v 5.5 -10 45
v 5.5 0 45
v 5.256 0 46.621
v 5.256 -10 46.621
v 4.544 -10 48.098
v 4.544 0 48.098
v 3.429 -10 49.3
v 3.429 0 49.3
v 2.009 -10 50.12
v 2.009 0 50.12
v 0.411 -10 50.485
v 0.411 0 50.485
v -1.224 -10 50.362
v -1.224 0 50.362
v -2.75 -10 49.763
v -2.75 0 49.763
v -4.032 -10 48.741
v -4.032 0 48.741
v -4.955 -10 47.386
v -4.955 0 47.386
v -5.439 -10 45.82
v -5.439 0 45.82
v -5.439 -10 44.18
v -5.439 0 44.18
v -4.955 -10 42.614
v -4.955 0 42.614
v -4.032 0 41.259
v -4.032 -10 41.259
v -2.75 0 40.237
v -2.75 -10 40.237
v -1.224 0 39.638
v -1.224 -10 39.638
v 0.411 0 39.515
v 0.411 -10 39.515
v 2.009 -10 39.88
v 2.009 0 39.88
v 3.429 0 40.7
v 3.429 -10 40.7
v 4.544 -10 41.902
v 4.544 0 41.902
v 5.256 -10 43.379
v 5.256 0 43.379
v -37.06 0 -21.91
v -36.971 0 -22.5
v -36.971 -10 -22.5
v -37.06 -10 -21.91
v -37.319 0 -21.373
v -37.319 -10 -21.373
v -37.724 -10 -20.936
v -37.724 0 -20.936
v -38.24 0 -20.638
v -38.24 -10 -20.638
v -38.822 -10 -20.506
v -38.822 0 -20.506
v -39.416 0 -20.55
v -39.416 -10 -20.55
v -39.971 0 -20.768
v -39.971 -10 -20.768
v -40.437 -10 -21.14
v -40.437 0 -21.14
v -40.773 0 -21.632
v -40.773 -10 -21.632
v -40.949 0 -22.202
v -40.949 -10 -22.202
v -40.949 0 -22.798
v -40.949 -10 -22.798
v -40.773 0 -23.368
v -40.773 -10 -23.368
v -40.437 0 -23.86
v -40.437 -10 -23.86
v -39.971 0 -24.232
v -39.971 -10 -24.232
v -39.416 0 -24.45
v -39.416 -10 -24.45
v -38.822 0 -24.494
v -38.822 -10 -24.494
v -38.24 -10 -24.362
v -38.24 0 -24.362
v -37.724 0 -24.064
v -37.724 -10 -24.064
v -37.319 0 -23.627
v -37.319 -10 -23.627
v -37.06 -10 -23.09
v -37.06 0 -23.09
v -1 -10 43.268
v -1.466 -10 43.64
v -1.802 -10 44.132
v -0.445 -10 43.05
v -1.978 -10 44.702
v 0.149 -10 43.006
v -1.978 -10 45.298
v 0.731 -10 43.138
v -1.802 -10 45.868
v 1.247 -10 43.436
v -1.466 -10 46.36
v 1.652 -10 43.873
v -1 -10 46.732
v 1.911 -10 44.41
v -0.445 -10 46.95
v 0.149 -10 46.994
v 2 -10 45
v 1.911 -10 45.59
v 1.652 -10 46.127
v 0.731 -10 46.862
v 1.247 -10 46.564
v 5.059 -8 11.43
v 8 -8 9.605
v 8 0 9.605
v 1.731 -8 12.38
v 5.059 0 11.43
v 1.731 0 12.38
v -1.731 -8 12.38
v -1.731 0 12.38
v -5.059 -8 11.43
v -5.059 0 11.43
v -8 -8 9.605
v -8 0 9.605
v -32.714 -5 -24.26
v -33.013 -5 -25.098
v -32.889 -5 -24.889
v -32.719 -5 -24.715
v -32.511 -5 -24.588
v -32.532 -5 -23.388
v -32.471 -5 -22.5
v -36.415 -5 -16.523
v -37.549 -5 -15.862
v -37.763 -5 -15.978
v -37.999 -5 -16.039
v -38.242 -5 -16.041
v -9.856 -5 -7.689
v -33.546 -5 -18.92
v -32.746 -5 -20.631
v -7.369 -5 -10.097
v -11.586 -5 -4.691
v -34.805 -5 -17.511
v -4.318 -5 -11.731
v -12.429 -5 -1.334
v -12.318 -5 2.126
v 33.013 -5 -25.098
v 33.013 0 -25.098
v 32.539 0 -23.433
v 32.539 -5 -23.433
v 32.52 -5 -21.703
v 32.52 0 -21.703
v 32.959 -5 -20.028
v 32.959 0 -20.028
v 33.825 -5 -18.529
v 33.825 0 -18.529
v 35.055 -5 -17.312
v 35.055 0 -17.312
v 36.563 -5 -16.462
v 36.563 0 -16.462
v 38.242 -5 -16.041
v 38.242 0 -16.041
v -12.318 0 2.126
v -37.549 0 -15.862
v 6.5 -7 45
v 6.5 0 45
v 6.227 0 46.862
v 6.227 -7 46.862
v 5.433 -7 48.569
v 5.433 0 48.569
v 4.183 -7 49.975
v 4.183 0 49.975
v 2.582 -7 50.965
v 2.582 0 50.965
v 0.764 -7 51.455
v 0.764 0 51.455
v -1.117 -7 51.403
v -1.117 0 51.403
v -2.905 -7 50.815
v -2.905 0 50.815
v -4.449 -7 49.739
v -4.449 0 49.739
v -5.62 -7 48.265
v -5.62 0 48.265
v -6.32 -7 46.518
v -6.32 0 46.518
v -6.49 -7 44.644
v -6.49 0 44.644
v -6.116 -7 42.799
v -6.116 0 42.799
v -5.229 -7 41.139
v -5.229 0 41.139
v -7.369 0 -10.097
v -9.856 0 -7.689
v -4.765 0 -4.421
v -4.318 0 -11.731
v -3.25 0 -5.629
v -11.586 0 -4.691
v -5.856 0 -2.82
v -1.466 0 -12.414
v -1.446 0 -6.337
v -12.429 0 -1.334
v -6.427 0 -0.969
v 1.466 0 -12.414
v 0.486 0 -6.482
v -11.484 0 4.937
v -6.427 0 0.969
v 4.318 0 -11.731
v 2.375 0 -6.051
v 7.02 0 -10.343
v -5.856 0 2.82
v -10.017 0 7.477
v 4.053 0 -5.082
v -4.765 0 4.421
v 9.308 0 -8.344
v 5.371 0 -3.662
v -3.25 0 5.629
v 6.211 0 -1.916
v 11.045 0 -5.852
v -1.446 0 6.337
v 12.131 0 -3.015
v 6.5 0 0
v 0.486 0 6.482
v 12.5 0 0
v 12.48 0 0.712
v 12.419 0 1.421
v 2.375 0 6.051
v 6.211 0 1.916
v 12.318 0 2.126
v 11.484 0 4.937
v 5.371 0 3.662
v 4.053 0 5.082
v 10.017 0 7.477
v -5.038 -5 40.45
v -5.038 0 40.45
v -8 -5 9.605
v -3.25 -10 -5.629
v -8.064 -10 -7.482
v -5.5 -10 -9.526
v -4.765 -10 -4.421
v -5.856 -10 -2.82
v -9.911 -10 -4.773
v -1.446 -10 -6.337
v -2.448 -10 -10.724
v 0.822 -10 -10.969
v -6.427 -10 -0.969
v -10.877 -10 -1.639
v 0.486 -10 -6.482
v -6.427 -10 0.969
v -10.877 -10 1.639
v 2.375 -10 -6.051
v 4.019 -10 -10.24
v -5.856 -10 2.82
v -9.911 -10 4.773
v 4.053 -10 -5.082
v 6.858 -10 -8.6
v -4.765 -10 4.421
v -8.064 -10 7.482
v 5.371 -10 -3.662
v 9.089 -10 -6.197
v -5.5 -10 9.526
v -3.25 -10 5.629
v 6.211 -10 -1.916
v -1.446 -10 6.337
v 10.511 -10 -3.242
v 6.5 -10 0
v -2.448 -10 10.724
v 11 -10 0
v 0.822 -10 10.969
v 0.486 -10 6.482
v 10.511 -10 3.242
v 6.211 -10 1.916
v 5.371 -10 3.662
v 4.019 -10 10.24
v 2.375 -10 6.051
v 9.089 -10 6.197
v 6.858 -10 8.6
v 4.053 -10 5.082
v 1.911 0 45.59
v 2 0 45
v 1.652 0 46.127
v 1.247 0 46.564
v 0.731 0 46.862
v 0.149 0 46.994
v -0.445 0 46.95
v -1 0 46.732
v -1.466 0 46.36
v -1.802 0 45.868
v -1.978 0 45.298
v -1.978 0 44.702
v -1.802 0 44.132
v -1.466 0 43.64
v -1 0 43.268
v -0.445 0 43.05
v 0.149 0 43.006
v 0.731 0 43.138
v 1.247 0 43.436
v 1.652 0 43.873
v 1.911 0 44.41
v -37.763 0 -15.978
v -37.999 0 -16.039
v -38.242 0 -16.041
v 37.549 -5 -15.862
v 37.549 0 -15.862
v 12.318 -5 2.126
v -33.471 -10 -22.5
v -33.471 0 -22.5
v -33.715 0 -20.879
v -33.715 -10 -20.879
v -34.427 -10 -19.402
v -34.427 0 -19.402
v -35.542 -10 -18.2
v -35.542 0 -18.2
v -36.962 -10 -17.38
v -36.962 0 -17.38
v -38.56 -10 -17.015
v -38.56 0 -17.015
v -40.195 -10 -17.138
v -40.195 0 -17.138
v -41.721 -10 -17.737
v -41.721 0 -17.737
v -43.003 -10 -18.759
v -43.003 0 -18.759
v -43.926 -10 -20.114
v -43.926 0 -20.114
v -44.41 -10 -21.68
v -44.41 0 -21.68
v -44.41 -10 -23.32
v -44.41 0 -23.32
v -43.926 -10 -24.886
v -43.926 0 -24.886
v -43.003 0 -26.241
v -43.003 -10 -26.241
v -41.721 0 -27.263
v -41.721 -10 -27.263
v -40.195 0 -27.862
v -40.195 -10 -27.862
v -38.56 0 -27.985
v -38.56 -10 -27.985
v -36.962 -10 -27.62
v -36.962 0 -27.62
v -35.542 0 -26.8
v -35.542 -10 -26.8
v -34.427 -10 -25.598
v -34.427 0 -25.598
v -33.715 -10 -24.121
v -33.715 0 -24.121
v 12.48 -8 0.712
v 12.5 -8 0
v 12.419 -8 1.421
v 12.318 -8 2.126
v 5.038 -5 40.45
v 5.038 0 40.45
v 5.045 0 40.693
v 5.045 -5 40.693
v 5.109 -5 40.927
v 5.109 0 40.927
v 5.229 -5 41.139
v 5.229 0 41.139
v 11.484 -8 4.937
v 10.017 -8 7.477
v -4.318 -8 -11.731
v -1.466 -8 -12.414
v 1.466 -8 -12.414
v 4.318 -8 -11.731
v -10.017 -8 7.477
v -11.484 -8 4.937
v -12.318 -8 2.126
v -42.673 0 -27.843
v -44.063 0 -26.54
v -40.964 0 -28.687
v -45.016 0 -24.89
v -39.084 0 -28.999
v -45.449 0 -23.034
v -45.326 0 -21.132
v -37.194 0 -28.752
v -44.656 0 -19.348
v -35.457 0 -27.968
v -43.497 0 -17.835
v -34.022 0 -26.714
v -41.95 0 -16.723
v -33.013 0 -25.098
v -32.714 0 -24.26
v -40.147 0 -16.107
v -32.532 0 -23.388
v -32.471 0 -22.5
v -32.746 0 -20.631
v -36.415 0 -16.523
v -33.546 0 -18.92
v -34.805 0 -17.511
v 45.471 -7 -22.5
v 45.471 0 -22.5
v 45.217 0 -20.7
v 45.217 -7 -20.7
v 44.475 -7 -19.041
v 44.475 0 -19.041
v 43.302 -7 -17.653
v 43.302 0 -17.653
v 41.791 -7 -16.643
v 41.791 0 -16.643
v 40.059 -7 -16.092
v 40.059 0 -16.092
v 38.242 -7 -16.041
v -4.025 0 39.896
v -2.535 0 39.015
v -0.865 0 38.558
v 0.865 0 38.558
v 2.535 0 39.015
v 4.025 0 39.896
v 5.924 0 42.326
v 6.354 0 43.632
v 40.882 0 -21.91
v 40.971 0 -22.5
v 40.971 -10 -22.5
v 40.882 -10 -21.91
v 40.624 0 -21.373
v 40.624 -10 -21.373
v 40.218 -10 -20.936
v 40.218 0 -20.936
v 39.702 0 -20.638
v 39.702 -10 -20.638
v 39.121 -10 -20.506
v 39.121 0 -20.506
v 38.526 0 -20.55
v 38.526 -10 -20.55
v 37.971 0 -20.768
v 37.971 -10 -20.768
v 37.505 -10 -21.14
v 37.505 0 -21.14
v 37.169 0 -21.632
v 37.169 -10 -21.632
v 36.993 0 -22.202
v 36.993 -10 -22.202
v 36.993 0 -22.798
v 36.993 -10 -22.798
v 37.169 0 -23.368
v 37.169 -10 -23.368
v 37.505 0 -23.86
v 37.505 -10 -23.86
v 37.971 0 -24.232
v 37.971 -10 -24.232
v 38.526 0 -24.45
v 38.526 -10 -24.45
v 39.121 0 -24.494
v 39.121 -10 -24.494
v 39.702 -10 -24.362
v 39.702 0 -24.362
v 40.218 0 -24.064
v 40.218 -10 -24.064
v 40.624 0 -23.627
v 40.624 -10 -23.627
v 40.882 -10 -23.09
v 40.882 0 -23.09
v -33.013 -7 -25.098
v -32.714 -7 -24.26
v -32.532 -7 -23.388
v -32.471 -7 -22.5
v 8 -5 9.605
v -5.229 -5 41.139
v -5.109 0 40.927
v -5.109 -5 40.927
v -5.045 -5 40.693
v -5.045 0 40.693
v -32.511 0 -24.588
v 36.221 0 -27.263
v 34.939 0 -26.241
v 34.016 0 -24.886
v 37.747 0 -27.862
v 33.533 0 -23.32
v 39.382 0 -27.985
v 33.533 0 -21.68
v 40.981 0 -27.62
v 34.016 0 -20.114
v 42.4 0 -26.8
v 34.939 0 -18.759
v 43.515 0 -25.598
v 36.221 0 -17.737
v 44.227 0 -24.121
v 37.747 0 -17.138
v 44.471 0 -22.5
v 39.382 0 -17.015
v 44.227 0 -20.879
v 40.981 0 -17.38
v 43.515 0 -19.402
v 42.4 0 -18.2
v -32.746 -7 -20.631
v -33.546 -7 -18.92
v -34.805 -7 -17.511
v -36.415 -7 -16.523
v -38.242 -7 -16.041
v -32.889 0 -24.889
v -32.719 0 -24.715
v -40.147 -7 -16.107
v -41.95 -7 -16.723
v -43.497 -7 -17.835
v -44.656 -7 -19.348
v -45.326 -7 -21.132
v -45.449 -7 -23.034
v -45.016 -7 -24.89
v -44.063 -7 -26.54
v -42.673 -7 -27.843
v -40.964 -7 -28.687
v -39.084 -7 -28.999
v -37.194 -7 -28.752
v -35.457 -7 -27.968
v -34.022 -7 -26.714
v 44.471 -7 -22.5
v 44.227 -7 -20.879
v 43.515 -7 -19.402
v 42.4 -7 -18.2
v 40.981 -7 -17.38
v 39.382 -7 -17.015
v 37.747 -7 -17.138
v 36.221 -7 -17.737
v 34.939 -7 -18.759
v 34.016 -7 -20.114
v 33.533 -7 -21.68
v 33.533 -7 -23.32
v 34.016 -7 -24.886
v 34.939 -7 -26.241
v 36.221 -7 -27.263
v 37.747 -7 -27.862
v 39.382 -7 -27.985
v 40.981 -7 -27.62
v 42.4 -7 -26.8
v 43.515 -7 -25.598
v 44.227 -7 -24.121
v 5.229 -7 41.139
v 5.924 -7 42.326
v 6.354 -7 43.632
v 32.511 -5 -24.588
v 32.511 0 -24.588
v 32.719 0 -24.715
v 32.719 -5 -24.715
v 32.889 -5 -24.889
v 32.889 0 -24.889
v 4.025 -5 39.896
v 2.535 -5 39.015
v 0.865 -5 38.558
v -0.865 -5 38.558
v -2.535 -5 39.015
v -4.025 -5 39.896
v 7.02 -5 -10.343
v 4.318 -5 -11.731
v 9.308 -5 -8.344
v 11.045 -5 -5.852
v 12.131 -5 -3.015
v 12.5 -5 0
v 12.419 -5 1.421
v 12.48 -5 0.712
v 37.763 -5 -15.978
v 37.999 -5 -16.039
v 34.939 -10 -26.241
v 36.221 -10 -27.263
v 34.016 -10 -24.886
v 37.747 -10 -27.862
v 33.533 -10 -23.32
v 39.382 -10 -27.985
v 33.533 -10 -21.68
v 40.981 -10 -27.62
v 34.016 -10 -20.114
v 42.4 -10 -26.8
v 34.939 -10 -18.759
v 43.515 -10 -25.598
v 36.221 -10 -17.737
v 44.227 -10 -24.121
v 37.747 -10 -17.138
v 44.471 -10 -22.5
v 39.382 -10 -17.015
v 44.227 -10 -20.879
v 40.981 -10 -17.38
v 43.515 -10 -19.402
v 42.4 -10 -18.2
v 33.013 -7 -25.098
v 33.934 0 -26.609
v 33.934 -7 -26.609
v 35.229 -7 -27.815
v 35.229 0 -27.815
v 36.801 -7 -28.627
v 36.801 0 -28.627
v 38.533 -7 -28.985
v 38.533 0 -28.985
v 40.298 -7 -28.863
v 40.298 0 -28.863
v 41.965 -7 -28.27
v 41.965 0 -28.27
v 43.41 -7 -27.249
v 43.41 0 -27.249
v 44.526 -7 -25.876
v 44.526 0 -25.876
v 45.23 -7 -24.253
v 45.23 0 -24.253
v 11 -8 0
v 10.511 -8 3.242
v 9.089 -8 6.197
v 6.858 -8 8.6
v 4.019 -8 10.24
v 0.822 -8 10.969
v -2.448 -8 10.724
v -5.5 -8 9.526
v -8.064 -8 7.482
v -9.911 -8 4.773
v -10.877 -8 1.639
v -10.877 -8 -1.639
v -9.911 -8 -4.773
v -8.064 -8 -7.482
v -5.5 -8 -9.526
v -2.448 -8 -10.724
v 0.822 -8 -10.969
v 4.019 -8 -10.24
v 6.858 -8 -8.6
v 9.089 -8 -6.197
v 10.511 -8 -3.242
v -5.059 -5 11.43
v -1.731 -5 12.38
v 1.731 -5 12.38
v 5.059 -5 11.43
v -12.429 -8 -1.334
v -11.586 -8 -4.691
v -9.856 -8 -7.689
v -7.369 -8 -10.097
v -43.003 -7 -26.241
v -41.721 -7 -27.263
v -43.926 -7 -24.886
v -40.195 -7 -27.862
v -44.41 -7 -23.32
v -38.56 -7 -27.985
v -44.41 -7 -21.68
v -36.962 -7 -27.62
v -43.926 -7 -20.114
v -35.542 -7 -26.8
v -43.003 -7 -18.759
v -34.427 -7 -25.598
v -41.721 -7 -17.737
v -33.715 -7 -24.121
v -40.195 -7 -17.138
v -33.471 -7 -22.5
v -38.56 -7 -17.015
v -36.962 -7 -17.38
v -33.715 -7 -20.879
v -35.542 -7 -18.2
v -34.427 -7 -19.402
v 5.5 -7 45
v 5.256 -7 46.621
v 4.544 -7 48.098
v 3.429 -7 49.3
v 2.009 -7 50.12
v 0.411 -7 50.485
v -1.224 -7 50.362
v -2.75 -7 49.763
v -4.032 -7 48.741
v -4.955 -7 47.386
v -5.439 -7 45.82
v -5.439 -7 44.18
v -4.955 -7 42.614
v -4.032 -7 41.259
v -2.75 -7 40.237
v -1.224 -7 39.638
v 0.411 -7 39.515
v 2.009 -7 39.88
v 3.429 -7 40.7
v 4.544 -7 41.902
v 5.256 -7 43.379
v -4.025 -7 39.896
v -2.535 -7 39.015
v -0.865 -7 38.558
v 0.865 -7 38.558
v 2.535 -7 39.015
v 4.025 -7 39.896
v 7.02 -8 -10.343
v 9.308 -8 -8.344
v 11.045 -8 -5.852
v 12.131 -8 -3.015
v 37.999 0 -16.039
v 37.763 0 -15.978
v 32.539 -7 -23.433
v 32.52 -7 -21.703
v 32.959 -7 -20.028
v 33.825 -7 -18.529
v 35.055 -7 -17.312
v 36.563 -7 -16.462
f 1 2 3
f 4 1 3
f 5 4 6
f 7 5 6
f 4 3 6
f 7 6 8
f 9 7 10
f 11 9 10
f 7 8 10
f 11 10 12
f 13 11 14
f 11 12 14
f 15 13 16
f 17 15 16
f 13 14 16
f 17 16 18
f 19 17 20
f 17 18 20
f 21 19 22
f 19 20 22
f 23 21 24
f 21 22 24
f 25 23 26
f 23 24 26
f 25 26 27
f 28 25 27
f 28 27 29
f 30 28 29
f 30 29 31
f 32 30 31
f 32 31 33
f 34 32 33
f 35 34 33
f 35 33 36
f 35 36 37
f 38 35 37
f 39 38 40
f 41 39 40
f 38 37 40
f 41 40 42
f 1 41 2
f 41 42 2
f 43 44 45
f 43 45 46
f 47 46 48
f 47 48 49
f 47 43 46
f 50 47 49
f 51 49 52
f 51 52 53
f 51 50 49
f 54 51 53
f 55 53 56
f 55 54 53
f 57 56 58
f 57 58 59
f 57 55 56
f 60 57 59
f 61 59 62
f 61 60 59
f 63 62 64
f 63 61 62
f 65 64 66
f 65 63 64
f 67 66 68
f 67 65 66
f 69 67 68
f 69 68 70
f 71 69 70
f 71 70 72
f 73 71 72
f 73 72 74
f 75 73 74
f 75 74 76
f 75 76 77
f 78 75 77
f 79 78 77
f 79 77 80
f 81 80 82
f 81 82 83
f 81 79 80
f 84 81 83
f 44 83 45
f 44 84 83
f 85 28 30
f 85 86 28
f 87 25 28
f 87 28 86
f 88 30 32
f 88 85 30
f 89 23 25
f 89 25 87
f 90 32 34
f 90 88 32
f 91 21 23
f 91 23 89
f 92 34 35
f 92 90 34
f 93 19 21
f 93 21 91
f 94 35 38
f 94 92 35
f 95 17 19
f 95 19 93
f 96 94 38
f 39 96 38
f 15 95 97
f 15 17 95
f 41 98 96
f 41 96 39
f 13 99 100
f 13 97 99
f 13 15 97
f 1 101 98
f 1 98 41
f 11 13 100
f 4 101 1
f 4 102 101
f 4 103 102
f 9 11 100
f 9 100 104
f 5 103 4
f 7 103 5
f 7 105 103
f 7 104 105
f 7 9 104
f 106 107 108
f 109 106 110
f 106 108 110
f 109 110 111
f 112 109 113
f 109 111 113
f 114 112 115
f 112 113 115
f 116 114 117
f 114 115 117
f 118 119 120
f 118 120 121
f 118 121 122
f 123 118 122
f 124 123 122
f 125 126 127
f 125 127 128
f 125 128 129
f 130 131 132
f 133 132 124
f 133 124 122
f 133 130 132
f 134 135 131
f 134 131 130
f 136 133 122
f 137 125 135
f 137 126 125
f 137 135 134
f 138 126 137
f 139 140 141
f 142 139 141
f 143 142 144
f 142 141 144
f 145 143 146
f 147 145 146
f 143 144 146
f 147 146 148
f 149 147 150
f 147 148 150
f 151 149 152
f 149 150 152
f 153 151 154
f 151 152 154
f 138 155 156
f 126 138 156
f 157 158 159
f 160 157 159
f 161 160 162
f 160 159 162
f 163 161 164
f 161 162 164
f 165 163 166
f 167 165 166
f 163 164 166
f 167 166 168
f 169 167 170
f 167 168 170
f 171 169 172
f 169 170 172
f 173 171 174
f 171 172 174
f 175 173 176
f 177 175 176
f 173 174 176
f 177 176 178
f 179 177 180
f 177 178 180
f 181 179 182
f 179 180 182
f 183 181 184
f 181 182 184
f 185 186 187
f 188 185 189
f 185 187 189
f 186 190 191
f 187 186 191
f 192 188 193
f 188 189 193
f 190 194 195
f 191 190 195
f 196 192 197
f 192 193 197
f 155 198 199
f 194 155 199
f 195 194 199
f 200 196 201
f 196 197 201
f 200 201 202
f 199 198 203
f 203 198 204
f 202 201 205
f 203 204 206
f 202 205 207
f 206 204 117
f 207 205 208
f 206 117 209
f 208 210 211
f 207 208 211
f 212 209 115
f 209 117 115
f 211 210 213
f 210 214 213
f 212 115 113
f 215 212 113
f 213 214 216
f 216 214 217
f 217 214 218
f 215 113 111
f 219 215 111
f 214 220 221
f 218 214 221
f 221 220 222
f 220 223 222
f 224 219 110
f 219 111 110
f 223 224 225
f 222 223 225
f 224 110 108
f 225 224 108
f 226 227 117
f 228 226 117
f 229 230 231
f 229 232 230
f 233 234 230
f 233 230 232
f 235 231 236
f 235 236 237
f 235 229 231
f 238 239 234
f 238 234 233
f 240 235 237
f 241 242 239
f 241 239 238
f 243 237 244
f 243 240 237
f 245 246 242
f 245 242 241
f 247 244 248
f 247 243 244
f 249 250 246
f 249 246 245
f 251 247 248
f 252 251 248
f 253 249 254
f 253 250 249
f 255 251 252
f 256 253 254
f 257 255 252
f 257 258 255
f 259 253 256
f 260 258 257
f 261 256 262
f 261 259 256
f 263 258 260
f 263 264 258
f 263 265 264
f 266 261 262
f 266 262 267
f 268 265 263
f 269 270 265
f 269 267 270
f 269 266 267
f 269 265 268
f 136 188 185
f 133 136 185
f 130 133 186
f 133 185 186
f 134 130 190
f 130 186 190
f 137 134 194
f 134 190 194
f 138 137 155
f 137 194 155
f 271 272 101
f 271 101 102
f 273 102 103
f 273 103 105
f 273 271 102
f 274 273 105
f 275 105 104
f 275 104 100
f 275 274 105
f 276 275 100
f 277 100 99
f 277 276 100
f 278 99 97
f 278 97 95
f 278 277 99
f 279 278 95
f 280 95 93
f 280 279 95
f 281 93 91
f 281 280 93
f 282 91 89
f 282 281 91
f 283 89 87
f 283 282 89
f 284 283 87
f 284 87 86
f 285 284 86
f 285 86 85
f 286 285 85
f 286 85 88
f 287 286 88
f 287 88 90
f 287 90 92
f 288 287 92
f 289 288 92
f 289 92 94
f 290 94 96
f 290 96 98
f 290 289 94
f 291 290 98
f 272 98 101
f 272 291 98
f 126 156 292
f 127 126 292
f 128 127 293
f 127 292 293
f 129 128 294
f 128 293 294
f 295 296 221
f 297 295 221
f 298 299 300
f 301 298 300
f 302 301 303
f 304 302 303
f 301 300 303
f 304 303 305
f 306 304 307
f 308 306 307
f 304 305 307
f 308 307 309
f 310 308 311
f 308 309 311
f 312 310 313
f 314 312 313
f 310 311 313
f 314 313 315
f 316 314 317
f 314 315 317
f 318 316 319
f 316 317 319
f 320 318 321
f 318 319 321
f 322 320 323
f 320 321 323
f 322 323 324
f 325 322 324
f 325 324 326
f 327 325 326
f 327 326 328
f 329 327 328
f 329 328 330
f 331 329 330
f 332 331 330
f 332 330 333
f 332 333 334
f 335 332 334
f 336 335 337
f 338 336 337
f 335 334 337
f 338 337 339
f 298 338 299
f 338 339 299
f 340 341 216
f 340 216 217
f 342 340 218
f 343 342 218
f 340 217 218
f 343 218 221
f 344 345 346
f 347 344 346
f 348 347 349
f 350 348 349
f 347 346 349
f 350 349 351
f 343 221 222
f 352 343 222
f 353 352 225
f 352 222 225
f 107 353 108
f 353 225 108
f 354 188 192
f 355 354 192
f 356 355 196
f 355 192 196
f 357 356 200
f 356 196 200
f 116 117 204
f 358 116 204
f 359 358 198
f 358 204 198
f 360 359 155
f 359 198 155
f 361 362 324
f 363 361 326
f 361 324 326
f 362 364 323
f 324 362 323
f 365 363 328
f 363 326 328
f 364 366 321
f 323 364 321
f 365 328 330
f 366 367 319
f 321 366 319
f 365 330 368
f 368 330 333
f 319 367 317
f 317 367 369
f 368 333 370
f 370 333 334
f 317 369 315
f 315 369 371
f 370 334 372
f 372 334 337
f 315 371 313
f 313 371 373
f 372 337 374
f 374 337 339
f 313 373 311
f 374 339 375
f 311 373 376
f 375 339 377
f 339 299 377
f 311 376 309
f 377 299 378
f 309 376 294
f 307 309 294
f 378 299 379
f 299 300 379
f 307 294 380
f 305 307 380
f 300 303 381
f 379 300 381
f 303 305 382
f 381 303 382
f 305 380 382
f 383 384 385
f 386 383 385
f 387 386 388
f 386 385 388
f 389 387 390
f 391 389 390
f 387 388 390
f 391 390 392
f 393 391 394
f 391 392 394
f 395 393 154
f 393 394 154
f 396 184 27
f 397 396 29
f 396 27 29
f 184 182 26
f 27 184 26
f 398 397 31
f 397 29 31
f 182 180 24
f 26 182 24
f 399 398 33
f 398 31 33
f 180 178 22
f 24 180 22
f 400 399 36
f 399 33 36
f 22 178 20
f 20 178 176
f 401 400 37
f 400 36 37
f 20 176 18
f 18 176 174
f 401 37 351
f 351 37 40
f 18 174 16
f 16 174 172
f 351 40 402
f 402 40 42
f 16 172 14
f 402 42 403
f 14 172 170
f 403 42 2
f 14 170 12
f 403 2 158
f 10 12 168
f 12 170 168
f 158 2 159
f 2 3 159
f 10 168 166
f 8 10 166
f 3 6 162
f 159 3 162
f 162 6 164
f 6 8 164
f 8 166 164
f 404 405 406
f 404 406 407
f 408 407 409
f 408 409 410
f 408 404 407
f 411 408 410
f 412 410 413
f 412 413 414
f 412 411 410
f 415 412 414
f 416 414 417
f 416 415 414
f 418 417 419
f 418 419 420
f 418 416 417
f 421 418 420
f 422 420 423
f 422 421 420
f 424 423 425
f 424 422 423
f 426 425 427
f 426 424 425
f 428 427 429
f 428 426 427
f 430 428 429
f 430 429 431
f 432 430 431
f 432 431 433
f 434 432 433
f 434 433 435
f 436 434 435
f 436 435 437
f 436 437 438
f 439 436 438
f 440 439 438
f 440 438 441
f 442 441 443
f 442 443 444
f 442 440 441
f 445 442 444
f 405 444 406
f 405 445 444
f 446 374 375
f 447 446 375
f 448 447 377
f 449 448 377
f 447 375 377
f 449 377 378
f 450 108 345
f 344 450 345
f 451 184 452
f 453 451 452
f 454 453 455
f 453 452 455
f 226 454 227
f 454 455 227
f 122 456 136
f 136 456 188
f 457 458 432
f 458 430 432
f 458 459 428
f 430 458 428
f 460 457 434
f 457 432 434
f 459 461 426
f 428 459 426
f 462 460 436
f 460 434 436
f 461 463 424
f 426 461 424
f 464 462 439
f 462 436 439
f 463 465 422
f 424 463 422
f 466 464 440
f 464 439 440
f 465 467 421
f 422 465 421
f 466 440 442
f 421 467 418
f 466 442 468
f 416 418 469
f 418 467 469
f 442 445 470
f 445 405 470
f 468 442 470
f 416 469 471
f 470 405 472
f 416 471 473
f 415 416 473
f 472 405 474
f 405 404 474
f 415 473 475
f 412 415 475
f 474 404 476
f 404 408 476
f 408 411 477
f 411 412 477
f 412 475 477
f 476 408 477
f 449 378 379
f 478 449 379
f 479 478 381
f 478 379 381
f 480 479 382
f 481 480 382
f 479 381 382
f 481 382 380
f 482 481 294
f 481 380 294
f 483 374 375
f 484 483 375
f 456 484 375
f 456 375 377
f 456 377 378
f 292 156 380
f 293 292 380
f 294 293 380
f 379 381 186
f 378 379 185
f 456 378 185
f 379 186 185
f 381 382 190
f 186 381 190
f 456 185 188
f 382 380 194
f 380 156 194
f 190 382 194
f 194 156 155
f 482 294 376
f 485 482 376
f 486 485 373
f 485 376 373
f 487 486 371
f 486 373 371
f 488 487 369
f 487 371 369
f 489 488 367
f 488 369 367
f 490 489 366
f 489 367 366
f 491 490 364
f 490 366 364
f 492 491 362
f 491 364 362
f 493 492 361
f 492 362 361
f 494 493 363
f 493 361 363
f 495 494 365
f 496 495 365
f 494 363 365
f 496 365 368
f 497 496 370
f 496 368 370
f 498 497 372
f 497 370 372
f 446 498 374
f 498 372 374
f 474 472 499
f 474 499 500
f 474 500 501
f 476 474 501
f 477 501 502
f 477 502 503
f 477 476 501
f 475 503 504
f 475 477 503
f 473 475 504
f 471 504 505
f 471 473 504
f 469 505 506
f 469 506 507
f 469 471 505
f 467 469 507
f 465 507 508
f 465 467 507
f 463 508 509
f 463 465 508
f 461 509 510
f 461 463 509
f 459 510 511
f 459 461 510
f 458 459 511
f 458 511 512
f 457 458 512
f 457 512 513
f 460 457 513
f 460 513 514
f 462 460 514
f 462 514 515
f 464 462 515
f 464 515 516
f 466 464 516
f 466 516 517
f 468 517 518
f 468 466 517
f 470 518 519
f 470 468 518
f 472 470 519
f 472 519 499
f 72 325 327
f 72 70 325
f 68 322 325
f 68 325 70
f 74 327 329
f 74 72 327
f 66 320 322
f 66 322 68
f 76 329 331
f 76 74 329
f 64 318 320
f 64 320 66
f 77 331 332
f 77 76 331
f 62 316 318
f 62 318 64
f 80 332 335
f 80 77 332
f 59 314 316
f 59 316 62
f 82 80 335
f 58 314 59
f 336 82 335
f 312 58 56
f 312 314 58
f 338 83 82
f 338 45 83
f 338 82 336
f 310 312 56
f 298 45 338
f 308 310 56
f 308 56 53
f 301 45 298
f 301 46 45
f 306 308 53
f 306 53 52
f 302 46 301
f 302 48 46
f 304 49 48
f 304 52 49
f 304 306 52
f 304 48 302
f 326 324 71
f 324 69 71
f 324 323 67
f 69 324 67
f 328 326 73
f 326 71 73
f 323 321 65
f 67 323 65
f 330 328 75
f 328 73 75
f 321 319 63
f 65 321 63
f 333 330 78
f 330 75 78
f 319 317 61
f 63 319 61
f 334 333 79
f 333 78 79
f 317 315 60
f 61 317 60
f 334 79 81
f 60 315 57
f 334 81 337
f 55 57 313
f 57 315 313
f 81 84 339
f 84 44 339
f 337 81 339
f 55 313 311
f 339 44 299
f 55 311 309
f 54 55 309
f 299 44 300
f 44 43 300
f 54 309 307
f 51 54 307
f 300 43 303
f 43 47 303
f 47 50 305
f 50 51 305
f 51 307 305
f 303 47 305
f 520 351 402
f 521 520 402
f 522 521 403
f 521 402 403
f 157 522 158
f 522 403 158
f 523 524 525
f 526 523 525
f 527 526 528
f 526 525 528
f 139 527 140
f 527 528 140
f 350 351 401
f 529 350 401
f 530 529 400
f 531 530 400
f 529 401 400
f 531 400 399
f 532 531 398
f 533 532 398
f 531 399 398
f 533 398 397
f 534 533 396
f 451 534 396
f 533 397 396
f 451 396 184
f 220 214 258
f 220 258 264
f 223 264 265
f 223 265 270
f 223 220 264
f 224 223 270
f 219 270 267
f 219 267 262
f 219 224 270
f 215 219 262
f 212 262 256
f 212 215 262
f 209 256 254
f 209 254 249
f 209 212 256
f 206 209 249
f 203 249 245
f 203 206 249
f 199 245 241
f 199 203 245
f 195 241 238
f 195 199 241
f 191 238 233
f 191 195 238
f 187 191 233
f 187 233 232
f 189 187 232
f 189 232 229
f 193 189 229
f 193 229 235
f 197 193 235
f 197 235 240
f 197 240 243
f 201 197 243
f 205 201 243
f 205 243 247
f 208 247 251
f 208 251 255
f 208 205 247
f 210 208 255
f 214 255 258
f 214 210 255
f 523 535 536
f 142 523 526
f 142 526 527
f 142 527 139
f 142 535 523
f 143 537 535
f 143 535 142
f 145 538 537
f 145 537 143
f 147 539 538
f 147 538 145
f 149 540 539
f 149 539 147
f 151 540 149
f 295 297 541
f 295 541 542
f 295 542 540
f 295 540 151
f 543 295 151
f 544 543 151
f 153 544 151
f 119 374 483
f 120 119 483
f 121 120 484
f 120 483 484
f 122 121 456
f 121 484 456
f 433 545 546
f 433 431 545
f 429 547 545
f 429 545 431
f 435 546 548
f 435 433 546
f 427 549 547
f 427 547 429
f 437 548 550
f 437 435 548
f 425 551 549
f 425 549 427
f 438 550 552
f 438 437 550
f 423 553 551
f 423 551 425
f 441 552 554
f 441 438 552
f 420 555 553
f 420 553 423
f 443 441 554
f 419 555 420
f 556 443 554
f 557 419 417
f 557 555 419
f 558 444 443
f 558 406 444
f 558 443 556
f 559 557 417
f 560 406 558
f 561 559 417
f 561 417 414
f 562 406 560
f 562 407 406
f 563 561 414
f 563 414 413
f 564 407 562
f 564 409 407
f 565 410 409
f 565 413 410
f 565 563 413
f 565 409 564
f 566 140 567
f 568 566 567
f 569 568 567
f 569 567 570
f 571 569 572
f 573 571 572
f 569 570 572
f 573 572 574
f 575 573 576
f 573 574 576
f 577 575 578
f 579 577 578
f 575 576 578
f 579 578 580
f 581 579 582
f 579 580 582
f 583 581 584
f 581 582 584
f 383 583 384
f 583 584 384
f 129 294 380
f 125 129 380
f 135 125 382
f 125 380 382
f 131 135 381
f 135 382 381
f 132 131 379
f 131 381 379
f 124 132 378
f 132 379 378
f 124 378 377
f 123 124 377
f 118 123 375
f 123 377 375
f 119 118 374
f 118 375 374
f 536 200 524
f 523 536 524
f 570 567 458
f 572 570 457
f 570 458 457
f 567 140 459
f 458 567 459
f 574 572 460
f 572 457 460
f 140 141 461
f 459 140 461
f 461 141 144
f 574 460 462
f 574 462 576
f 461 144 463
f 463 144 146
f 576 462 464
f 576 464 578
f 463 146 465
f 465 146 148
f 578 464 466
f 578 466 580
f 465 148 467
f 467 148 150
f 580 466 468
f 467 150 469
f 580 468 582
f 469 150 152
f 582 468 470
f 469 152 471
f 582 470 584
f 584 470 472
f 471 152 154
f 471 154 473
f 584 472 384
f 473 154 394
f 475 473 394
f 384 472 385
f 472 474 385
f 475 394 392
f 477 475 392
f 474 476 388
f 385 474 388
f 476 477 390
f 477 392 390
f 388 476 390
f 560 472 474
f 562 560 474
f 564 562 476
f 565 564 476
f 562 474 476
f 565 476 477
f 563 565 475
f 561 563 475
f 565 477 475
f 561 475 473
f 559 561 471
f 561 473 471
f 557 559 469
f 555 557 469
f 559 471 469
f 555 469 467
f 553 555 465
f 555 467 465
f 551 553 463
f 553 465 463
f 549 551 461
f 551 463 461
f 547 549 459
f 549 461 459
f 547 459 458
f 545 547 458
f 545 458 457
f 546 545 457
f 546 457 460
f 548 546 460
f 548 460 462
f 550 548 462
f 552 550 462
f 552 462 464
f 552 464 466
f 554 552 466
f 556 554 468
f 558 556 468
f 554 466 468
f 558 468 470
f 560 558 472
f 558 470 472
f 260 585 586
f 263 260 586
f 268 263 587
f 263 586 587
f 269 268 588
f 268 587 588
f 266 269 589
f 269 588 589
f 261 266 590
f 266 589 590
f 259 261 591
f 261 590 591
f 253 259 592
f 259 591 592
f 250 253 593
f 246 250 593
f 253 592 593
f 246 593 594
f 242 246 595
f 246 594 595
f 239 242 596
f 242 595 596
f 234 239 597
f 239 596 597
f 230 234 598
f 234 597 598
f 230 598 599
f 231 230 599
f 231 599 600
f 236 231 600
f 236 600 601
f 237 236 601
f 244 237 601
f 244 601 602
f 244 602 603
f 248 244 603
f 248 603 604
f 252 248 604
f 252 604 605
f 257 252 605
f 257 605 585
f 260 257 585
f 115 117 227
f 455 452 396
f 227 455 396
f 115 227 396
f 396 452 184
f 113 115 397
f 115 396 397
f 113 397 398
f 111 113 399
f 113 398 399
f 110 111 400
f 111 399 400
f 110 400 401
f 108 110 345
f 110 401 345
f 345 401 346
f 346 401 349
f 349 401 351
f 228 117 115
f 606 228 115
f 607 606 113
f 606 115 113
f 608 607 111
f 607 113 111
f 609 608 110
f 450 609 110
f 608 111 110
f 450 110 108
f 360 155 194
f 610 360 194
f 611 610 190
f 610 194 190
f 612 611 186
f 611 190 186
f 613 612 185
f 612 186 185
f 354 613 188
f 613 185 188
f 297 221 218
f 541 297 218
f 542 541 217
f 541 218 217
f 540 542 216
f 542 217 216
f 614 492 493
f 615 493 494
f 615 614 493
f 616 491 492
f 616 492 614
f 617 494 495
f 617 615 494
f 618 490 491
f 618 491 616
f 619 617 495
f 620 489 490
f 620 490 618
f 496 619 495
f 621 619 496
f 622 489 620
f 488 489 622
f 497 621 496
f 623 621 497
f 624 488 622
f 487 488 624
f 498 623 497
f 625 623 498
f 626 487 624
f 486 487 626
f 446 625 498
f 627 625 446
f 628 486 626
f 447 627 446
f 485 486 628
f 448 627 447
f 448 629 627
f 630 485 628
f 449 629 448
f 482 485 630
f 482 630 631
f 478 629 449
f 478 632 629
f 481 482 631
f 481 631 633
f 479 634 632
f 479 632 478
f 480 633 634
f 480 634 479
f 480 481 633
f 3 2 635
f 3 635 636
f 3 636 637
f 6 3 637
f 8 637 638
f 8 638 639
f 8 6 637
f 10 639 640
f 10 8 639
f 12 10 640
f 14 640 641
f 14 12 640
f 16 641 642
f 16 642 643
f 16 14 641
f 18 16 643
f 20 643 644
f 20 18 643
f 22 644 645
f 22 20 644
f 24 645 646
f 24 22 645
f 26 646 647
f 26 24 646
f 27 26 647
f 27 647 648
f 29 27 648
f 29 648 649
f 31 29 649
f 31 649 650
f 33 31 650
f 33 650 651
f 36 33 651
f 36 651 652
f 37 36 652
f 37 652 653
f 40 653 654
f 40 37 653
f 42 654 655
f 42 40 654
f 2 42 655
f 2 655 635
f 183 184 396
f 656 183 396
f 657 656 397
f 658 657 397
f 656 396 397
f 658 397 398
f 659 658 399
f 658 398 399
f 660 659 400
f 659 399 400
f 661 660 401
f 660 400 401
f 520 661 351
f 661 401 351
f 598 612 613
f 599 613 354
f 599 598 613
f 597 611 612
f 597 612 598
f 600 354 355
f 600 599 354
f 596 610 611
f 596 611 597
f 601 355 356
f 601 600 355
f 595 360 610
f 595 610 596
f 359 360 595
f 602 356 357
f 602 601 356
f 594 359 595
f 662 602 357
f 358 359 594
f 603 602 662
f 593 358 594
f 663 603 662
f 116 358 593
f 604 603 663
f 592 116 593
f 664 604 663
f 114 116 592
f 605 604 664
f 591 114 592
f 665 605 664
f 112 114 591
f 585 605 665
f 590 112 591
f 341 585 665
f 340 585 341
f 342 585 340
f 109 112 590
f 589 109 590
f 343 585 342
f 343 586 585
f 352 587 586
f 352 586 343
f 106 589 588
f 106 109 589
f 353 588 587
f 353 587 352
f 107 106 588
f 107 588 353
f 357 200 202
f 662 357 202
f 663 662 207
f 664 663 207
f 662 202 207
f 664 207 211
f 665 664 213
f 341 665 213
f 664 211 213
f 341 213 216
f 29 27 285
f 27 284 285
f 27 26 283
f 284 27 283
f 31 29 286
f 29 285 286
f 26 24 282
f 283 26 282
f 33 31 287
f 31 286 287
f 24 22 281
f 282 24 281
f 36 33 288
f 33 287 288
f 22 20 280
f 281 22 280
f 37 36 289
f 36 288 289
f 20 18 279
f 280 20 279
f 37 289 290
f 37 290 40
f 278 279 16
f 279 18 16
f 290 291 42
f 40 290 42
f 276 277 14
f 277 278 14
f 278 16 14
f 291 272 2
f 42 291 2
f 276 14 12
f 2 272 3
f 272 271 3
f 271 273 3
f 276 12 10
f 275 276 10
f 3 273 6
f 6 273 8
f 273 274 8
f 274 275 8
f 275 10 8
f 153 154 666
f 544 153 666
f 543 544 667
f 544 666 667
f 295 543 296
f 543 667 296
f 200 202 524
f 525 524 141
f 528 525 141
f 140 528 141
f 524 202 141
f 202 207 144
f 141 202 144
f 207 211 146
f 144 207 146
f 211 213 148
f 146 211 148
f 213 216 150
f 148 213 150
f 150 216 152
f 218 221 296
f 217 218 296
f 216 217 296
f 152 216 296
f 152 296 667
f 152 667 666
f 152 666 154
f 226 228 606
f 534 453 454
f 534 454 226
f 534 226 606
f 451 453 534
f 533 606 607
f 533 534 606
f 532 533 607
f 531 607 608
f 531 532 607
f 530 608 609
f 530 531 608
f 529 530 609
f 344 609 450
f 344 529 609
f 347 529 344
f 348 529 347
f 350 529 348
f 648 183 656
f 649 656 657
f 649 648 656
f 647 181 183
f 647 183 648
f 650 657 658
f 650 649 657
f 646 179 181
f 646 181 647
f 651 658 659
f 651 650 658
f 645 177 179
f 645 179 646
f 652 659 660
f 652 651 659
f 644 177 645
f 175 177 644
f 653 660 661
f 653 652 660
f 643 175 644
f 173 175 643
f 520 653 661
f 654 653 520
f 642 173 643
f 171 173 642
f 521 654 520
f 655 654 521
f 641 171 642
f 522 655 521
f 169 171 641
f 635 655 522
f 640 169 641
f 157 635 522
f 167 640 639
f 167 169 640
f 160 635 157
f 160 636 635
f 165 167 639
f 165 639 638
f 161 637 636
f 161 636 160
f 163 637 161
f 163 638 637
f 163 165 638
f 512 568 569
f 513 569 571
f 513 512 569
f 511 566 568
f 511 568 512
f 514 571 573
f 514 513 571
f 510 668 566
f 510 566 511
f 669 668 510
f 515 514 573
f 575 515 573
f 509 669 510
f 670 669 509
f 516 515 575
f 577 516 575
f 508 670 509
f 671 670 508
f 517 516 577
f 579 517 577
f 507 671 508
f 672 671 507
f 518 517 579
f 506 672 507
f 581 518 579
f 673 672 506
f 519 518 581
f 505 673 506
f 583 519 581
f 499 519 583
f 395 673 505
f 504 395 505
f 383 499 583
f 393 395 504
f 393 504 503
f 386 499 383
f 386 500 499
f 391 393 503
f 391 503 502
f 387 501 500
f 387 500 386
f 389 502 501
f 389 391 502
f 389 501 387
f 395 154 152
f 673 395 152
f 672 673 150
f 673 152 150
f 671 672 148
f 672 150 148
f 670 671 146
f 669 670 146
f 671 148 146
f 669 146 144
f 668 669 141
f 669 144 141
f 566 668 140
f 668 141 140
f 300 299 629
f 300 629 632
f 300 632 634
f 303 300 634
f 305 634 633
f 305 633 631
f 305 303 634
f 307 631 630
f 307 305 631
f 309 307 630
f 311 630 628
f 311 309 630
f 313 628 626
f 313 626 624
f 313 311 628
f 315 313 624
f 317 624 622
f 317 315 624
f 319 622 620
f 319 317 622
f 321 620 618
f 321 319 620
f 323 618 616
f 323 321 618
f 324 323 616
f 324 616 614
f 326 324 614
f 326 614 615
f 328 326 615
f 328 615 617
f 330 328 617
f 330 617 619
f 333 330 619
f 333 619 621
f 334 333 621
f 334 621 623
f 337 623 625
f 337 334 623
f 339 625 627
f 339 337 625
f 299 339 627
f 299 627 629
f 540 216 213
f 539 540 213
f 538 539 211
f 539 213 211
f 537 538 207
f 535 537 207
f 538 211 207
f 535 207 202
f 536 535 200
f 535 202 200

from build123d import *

# Parameters (mm, degrees)
F1_DEPTH = 5
F0_R     = 11
F2_DEPTH = 8
F0_R_2   = 6.5
F3_DEPTH = 10
F0_R_3   = 5.5
F4_DEPTH = 7
F0_R_4   = 2
F5_DEPTH = 10


with BuildPart() as f1:
    # F0 (on Front) → F1 (new body)
    with BuildSketch(Plane.XZ):
        with BuildLine():
            ThreePointArc((-8, 9.604686), (0, 12.5), (8, 9.604686))
            Line((8, 9.604686), (5.038139, 40.449513))
            ThreePointArc((5.038139, 40.449513), (5.069826, 40.811961), (5.229085, 41.139085))
            ThreePointArc((5.229085, 41.139085), (0, 38.5), (-5.229085, 41.139085))
            ThreePointArc((-5.229085, 41.139085), (-5.069826, 40.811961), (-5.038139, 40.449513))
            Line((-5.038139, 40.449513), (-8, 9.604686))
        make_face()
        with BuildLine():
            ThreePointArc((12.317902, 2.12586), (12.454392, 1.066822), (12.5, 0))
            ThreePointArc((12.5, 0), (10.252409, -7.151092), (4.317902, -11.730546))
            Line((4.317902, -11.730546), (32.511236, -24.587912))
            ThreePointArc((32.511236, -24.587912), (32.809283, -24.796579), (33.01295, -25.098063))
            ThreePointArc((33.01295, -25.098063), (33.341978, -19.25), (38.242035, -16.041022))
            ThreePointArc((38.242035, -16.041022), (37.879108, -16.015383), (37.549375, -15.8616))
            Line((37.549375, -15.8616), (12.317902, 2.12586))
        make_face()
        with BuildLine():
            Line((-32.511236, -24.587912), (-4.317902, -11.730546))
            ThreePointArc((-4.317902, -11.730546), (-10.825318, -6.25), (-12.317902, 2.12586))
            Line((-12.317902, 2.12586), (-37.549375, -15.8616))
            ThreePointArc((-37.549375, -15.8616), (-37.879108, -16.015383), (-38.242035, -16.041022))
            ThreePointArc((-38.242035, -16.041022), (-34.12402, -18.16925), (-32.471143, -22.5))
            ThreePointArc((-32.471143, -22.5), (-32.608036, -23.826978), (-33.01295, -25.098063))
            ThreePointArc((-33.01295, -25.098063), (-32.809283, -24.796579), (-32.511236, -24.587912))
        make_face()
    extrude(amount=F1_DEPTH)


with BuildPart() as f2:
    # F0 (on Front) → F2 (new body)
    with BuildSketch(Plane.XZ):
        with BuildLine():
            ThreePointArc((4.317902, -11.730546), (10.252409, -7.151092), (12.5, 0))
            ThreePointArc((12.5, 0), (12.454392, 1.066822), (12.317902, 2.12586))
            ThreePointArc((12.317902, 2.12586), (10.825318, 6.25), (8, 9.604686))
            ThreePointArc((8, 9.604686), (0, 12.5), (-8, 9.604686))
            ThreePointArc((-8, 9.604686), (-10.825318, 6.25), (-12.317902, 2.12586))
            ThreePointArc((-12.317902, 2.12586), (-10.825318, -6.25), (-4.317902, -11.730546))
            ThreePointArc((-4.317902, -11.730546), (0, -12.5), (4.317902, -11.730546))
        make_face()
        Circle(F0_R, mode=Mode.SUBTRACT)
    extrude(amount=F2_DEPTH)

    # F0 (on Front) → F3 (join)
    with BuildSketch(Plane.XZ):
        Circle(F0_R)
        Circle(F0_R_2, mode=Mode.SUBTRACT)
    extrude(amount=F3_DEPTH)


with BuildPart() as f4:
    # F0 (on Front) → F4 (new body)
    with BuildSketch(Plane.XZ):
        with BuildLine():
            ThreePointArc((-38.242035, -16.041022), (-44.600308, -25.75), (-33.01295, -25.098063))
            ThreePointArc((-33.01295, -25.098063), (-32.608036, -23.826978), (-32.471143, -22.5))
            ThreePointArc((-32.471143, -22.5), (-34.12402, -18.16925), (-38.242035, -16.041022))
        make_face()
        with Locations((-38.971143, -22.5)):
            Circle(F0_R_3, mode=Mode.SUBTRACT)
        with BuildLine():
            ThreePointArc((45.471143, -22.5), (43.301893, -17.652877), (38.242035, -16.041022))
            ThreePointArc((38.242035, -16.041022), (33.341978, -19.25), (33.01295, -25.098063))
            ThreePointArc((33.01295, -25.098063), (40.298121, -28.863107), (45.471143, -22.5))
        make_face()
        with Locations((38.971143, -22.5)):
            Circle(F0_R_3, mode=Mode.SUBTRACT)
        with BuildLine():
            ThreePointArc((-5.229085, 41.139085), (0, 38.5), (5.229085, 41.139085))
            ThreePointArc((5.229085, 41.139085), (6.174101, 42.967643), (6.5, 45))
            ThreePointArc((6.5, 45), (-2.032357, 51.174101), (-5.229085, 41.139085))
        make_face()
        with Locations((0, 45)):
            Circle(F0_R_3, mode=Mode.SUBTRACT)
    extrude(amount=F4_DEPTH)


with BuildPart() as f5:
    # F0 (on Front) → F5 (new body)
    with BuildSketch(Plane.XZ):
        with Locations((0, 45)):
            Circle(F0_R_3)
        with Locations((0, 45)):
            Circle(F0_R_4, mode=Mode.SUBTRACT)
        with Locations((38.971143, -22.5)):
            Circle(F0_R_3)
        with Locations((38.971143, -22.5)):
            Circle(F0_R_4, mode=Mode.SUBTRACT)
        with Locations((-38.971143, -22.5)):
            Circle(F0_R_3)
        with Locations((-38.971143, -22.5)):
            Circle(F0_R_4, mode=Mode.SUBTRACT)
    extrude(amount=F5_DEPTH)


solid = Compound([f1.part, f2.part, f4.part, f5.part])
